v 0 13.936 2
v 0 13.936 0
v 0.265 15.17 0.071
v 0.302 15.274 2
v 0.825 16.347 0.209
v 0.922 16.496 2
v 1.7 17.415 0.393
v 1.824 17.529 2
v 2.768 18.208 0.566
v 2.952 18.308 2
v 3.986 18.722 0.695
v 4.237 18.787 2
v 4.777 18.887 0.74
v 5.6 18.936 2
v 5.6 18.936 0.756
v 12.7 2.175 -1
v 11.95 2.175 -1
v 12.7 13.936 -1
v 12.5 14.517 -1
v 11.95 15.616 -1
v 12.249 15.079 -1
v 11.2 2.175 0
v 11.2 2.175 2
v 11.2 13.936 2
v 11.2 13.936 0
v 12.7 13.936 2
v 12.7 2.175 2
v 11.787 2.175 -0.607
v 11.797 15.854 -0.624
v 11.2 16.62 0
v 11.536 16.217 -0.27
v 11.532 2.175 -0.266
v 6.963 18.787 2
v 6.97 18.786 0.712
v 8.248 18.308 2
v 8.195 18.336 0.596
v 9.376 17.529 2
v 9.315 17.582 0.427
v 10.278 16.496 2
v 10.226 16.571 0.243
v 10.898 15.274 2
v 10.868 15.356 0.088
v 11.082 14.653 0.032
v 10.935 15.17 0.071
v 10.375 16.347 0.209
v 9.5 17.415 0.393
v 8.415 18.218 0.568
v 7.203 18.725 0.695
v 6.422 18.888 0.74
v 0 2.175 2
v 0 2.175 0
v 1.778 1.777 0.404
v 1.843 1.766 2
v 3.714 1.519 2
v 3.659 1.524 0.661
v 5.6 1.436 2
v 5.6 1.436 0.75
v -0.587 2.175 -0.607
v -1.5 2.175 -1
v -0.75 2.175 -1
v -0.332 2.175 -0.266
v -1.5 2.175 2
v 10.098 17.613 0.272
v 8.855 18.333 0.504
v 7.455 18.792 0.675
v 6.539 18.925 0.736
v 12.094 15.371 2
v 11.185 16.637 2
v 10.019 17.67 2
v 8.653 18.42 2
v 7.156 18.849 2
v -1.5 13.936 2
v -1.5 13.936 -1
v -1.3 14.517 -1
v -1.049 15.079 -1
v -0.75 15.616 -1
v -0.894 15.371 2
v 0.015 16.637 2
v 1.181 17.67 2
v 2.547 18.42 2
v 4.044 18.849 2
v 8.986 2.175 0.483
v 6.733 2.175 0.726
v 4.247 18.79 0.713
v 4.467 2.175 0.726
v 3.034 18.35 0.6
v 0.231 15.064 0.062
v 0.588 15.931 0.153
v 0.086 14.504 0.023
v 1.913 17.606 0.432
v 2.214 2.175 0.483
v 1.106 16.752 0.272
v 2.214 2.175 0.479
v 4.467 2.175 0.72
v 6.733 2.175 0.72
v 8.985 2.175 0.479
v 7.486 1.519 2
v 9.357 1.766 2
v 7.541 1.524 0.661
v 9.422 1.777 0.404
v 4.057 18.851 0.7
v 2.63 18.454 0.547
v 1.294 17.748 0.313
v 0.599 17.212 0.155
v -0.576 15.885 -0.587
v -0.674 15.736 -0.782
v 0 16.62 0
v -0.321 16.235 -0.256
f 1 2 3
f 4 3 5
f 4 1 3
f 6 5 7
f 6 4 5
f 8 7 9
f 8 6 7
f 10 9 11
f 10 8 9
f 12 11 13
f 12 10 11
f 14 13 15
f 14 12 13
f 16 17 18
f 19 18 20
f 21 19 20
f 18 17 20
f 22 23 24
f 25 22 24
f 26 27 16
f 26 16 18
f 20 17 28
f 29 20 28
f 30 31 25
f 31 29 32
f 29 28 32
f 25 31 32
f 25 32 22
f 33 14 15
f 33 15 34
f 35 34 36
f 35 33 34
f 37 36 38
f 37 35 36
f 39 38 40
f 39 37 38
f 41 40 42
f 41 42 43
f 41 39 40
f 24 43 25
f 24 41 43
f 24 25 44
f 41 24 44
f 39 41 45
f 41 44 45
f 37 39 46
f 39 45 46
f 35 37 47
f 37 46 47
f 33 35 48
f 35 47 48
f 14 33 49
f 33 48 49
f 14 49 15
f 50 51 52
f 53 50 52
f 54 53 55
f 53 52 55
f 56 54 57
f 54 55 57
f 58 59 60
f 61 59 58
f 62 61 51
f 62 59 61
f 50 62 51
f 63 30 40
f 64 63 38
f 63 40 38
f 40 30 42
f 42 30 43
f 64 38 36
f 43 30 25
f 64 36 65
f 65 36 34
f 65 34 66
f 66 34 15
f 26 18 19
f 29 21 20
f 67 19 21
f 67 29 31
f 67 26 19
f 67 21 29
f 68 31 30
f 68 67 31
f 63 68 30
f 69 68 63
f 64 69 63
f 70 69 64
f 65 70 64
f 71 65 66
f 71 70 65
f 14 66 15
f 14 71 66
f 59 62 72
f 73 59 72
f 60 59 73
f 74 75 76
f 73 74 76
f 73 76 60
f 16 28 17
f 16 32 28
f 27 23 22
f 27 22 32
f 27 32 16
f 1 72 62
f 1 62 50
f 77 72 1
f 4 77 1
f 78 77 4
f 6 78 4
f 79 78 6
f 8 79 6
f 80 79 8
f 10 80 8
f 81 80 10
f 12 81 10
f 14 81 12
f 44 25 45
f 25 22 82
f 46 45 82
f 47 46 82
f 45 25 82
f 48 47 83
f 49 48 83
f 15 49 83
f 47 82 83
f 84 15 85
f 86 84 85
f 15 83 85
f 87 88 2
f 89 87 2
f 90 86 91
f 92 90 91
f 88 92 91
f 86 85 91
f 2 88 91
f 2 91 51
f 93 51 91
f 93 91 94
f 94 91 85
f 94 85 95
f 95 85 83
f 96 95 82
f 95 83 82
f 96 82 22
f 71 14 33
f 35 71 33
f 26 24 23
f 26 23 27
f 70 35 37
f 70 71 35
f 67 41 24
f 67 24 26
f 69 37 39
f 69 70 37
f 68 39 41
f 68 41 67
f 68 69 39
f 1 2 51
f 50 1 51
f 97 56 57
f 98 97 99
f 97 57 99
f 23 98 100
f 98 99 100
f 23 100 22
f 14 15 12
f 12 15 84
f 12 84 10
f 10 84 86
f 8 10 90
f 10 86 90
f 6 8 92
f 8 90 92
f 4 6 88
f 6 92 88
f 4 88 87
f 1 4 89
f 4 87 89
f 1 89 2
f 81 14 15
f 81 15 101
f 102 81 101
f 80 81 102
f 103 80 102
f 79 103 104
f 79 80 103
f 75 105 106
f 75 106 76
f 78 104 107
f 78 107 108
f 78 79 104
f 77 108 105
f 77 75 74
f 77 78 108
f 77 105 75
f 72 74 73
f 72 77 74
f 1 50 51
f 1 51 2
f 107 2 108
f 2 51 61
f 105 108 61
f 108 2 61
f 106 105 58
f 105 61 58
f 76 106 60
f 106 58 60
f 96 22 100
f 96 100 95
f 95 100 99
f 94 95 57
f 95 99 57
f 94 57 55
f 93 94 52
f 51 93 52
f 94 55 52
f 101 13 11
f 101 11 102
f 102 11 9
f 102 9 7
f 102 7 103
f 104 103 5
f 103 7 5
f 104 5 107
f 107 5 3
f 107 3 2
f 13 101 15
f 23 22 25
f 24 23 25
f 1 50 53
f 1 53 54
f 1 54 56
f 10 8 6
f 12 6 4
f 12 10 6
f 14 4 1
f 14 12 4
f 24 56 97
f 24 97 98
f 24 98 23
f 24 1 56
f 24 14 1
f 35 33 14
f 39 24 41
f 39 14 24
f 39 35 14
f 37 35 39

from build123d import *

# Parameters (mm, degrees)
F1_DEPTH = 2
F3_DEPTH = 25
F4_W     = 1.5
F4_H     = 11.760625
F5_DEPTH = 3
F7_DEPTH = 25
F9_DEPTH = 16.772419


with BuildPart() as f1:
    # F0 (on Top) → F1 (new body)
    with BuildSketch(Plane.XY):
        with BuildLine():
            ThreePointArc((11.2, 13.93612), (9.375652, 17.52885), (5.6, 18.93612))
            ThreePointArc((5.6, 18.93612), (1.824348, 17.52885), (0, 13.93612))
            Line((0, 13.93612), (0, 2.175495))
            ThreePointArc((0, 2.175495), (2.7757, 1.621762), (5.6, 1.43612))
            ThreePointArc((5.6, 1.43612), (8.4243, 1.621762), (11.2, 2.175495))
            Line((11.2, 2.175495), (11.2, 13.93612))
        make_face()
    extrude(amount=F1_DEPTH)

    # F2 (on Front) → F3 (cut)
    with BuildSketch(Plane.XZ):
        with BuildLine():
            Line((0, 0), (11.2, -5.5e-05))
            ThreePointArc((11.2, -5.5e-05), (5.600004, 0.750103), (0, 0))
        make_face()
    extrude(amount=-F3_DEPTH, mode=Mode.SUBTRACT)


with BuildPart() as f5:
    # F4 (on face) → F5 (new body)
    with BuildSketch(Plane.XY.offset(2)):
        with BuildLine():
            ThreePointArc((12.7, 13.93612), (10.019038, 17.670153), (5.6, 18.93612))
            ThreePointArc((5.6, 18.93612), (9.375652, 17.52885), (11.2, 13.93612))
            Line((11.2, 13.93612), (12.7, 13.93612))
        make_face()
        with Locations((11.95, 8.055808)):
            Rectangle(F4_W, F4_H)
        with BuildLine():
            Line((-1.5, 13.93612), (0, 13.93612))
            ThreePointArc((0, 13.93612), (1.824348, 17.52885), (5.6, 18.93612))
            ThreePointArc((5.6, 18.93612), (1.180962, 17.670153), (-1.5, 13.93612))
        make_face()
        with Locations((-0.75, 8.055808)):
            Rectangle(F4_W, F4_H)
    extrude(amount=-F5_DEPTH)

    # F6 (on face) → F7 (cut)
    with BuildSketch(Plane.XZ.offset(-2.175495)):
        with BuildLine():
            Line((0, -1), (0, 0))
            ThreePointArc((0, 0), (-0.470247, -0.428565), (-0.75, -1))
            Line((-0.75, -1), (0, -1))
        make_face()
    extrude(amount=-F7_DEPTH, mode=Mode.SUBTRACT)


with BuildPart() as f9_tool:
    # F8 (on face) → F9 (new body, through all)
    with BuildSketch(Plane.XZ.offset(-2.175495)):
        with BuildLine():
            Line((0, -1), (11.95, -1))
            ThreePointArc((11.95, -1), (11.670247, -0.428565), (11.2, 0))
            ThreePointArc((11.2, 0), (5.6, 0.756473), (0, 0))
            Line((0, 0), (0, -1))
        make_face()
    extrude(amount=-F9_DEPTH)


with BuildPart() as f1_1:
    add(f1.part)

    # F9: cut by f9_tool
    add(f9_tool.part, mode=Mode.SUBTRACT)


with BuildPart() as f5_1:
    add(f5.part)

    # F9: cut by f9_tool
    add(f9_tool.part, mode=Mode.SUBTRACT)


solid = Compound([f1_1.part, f5_1.part])
